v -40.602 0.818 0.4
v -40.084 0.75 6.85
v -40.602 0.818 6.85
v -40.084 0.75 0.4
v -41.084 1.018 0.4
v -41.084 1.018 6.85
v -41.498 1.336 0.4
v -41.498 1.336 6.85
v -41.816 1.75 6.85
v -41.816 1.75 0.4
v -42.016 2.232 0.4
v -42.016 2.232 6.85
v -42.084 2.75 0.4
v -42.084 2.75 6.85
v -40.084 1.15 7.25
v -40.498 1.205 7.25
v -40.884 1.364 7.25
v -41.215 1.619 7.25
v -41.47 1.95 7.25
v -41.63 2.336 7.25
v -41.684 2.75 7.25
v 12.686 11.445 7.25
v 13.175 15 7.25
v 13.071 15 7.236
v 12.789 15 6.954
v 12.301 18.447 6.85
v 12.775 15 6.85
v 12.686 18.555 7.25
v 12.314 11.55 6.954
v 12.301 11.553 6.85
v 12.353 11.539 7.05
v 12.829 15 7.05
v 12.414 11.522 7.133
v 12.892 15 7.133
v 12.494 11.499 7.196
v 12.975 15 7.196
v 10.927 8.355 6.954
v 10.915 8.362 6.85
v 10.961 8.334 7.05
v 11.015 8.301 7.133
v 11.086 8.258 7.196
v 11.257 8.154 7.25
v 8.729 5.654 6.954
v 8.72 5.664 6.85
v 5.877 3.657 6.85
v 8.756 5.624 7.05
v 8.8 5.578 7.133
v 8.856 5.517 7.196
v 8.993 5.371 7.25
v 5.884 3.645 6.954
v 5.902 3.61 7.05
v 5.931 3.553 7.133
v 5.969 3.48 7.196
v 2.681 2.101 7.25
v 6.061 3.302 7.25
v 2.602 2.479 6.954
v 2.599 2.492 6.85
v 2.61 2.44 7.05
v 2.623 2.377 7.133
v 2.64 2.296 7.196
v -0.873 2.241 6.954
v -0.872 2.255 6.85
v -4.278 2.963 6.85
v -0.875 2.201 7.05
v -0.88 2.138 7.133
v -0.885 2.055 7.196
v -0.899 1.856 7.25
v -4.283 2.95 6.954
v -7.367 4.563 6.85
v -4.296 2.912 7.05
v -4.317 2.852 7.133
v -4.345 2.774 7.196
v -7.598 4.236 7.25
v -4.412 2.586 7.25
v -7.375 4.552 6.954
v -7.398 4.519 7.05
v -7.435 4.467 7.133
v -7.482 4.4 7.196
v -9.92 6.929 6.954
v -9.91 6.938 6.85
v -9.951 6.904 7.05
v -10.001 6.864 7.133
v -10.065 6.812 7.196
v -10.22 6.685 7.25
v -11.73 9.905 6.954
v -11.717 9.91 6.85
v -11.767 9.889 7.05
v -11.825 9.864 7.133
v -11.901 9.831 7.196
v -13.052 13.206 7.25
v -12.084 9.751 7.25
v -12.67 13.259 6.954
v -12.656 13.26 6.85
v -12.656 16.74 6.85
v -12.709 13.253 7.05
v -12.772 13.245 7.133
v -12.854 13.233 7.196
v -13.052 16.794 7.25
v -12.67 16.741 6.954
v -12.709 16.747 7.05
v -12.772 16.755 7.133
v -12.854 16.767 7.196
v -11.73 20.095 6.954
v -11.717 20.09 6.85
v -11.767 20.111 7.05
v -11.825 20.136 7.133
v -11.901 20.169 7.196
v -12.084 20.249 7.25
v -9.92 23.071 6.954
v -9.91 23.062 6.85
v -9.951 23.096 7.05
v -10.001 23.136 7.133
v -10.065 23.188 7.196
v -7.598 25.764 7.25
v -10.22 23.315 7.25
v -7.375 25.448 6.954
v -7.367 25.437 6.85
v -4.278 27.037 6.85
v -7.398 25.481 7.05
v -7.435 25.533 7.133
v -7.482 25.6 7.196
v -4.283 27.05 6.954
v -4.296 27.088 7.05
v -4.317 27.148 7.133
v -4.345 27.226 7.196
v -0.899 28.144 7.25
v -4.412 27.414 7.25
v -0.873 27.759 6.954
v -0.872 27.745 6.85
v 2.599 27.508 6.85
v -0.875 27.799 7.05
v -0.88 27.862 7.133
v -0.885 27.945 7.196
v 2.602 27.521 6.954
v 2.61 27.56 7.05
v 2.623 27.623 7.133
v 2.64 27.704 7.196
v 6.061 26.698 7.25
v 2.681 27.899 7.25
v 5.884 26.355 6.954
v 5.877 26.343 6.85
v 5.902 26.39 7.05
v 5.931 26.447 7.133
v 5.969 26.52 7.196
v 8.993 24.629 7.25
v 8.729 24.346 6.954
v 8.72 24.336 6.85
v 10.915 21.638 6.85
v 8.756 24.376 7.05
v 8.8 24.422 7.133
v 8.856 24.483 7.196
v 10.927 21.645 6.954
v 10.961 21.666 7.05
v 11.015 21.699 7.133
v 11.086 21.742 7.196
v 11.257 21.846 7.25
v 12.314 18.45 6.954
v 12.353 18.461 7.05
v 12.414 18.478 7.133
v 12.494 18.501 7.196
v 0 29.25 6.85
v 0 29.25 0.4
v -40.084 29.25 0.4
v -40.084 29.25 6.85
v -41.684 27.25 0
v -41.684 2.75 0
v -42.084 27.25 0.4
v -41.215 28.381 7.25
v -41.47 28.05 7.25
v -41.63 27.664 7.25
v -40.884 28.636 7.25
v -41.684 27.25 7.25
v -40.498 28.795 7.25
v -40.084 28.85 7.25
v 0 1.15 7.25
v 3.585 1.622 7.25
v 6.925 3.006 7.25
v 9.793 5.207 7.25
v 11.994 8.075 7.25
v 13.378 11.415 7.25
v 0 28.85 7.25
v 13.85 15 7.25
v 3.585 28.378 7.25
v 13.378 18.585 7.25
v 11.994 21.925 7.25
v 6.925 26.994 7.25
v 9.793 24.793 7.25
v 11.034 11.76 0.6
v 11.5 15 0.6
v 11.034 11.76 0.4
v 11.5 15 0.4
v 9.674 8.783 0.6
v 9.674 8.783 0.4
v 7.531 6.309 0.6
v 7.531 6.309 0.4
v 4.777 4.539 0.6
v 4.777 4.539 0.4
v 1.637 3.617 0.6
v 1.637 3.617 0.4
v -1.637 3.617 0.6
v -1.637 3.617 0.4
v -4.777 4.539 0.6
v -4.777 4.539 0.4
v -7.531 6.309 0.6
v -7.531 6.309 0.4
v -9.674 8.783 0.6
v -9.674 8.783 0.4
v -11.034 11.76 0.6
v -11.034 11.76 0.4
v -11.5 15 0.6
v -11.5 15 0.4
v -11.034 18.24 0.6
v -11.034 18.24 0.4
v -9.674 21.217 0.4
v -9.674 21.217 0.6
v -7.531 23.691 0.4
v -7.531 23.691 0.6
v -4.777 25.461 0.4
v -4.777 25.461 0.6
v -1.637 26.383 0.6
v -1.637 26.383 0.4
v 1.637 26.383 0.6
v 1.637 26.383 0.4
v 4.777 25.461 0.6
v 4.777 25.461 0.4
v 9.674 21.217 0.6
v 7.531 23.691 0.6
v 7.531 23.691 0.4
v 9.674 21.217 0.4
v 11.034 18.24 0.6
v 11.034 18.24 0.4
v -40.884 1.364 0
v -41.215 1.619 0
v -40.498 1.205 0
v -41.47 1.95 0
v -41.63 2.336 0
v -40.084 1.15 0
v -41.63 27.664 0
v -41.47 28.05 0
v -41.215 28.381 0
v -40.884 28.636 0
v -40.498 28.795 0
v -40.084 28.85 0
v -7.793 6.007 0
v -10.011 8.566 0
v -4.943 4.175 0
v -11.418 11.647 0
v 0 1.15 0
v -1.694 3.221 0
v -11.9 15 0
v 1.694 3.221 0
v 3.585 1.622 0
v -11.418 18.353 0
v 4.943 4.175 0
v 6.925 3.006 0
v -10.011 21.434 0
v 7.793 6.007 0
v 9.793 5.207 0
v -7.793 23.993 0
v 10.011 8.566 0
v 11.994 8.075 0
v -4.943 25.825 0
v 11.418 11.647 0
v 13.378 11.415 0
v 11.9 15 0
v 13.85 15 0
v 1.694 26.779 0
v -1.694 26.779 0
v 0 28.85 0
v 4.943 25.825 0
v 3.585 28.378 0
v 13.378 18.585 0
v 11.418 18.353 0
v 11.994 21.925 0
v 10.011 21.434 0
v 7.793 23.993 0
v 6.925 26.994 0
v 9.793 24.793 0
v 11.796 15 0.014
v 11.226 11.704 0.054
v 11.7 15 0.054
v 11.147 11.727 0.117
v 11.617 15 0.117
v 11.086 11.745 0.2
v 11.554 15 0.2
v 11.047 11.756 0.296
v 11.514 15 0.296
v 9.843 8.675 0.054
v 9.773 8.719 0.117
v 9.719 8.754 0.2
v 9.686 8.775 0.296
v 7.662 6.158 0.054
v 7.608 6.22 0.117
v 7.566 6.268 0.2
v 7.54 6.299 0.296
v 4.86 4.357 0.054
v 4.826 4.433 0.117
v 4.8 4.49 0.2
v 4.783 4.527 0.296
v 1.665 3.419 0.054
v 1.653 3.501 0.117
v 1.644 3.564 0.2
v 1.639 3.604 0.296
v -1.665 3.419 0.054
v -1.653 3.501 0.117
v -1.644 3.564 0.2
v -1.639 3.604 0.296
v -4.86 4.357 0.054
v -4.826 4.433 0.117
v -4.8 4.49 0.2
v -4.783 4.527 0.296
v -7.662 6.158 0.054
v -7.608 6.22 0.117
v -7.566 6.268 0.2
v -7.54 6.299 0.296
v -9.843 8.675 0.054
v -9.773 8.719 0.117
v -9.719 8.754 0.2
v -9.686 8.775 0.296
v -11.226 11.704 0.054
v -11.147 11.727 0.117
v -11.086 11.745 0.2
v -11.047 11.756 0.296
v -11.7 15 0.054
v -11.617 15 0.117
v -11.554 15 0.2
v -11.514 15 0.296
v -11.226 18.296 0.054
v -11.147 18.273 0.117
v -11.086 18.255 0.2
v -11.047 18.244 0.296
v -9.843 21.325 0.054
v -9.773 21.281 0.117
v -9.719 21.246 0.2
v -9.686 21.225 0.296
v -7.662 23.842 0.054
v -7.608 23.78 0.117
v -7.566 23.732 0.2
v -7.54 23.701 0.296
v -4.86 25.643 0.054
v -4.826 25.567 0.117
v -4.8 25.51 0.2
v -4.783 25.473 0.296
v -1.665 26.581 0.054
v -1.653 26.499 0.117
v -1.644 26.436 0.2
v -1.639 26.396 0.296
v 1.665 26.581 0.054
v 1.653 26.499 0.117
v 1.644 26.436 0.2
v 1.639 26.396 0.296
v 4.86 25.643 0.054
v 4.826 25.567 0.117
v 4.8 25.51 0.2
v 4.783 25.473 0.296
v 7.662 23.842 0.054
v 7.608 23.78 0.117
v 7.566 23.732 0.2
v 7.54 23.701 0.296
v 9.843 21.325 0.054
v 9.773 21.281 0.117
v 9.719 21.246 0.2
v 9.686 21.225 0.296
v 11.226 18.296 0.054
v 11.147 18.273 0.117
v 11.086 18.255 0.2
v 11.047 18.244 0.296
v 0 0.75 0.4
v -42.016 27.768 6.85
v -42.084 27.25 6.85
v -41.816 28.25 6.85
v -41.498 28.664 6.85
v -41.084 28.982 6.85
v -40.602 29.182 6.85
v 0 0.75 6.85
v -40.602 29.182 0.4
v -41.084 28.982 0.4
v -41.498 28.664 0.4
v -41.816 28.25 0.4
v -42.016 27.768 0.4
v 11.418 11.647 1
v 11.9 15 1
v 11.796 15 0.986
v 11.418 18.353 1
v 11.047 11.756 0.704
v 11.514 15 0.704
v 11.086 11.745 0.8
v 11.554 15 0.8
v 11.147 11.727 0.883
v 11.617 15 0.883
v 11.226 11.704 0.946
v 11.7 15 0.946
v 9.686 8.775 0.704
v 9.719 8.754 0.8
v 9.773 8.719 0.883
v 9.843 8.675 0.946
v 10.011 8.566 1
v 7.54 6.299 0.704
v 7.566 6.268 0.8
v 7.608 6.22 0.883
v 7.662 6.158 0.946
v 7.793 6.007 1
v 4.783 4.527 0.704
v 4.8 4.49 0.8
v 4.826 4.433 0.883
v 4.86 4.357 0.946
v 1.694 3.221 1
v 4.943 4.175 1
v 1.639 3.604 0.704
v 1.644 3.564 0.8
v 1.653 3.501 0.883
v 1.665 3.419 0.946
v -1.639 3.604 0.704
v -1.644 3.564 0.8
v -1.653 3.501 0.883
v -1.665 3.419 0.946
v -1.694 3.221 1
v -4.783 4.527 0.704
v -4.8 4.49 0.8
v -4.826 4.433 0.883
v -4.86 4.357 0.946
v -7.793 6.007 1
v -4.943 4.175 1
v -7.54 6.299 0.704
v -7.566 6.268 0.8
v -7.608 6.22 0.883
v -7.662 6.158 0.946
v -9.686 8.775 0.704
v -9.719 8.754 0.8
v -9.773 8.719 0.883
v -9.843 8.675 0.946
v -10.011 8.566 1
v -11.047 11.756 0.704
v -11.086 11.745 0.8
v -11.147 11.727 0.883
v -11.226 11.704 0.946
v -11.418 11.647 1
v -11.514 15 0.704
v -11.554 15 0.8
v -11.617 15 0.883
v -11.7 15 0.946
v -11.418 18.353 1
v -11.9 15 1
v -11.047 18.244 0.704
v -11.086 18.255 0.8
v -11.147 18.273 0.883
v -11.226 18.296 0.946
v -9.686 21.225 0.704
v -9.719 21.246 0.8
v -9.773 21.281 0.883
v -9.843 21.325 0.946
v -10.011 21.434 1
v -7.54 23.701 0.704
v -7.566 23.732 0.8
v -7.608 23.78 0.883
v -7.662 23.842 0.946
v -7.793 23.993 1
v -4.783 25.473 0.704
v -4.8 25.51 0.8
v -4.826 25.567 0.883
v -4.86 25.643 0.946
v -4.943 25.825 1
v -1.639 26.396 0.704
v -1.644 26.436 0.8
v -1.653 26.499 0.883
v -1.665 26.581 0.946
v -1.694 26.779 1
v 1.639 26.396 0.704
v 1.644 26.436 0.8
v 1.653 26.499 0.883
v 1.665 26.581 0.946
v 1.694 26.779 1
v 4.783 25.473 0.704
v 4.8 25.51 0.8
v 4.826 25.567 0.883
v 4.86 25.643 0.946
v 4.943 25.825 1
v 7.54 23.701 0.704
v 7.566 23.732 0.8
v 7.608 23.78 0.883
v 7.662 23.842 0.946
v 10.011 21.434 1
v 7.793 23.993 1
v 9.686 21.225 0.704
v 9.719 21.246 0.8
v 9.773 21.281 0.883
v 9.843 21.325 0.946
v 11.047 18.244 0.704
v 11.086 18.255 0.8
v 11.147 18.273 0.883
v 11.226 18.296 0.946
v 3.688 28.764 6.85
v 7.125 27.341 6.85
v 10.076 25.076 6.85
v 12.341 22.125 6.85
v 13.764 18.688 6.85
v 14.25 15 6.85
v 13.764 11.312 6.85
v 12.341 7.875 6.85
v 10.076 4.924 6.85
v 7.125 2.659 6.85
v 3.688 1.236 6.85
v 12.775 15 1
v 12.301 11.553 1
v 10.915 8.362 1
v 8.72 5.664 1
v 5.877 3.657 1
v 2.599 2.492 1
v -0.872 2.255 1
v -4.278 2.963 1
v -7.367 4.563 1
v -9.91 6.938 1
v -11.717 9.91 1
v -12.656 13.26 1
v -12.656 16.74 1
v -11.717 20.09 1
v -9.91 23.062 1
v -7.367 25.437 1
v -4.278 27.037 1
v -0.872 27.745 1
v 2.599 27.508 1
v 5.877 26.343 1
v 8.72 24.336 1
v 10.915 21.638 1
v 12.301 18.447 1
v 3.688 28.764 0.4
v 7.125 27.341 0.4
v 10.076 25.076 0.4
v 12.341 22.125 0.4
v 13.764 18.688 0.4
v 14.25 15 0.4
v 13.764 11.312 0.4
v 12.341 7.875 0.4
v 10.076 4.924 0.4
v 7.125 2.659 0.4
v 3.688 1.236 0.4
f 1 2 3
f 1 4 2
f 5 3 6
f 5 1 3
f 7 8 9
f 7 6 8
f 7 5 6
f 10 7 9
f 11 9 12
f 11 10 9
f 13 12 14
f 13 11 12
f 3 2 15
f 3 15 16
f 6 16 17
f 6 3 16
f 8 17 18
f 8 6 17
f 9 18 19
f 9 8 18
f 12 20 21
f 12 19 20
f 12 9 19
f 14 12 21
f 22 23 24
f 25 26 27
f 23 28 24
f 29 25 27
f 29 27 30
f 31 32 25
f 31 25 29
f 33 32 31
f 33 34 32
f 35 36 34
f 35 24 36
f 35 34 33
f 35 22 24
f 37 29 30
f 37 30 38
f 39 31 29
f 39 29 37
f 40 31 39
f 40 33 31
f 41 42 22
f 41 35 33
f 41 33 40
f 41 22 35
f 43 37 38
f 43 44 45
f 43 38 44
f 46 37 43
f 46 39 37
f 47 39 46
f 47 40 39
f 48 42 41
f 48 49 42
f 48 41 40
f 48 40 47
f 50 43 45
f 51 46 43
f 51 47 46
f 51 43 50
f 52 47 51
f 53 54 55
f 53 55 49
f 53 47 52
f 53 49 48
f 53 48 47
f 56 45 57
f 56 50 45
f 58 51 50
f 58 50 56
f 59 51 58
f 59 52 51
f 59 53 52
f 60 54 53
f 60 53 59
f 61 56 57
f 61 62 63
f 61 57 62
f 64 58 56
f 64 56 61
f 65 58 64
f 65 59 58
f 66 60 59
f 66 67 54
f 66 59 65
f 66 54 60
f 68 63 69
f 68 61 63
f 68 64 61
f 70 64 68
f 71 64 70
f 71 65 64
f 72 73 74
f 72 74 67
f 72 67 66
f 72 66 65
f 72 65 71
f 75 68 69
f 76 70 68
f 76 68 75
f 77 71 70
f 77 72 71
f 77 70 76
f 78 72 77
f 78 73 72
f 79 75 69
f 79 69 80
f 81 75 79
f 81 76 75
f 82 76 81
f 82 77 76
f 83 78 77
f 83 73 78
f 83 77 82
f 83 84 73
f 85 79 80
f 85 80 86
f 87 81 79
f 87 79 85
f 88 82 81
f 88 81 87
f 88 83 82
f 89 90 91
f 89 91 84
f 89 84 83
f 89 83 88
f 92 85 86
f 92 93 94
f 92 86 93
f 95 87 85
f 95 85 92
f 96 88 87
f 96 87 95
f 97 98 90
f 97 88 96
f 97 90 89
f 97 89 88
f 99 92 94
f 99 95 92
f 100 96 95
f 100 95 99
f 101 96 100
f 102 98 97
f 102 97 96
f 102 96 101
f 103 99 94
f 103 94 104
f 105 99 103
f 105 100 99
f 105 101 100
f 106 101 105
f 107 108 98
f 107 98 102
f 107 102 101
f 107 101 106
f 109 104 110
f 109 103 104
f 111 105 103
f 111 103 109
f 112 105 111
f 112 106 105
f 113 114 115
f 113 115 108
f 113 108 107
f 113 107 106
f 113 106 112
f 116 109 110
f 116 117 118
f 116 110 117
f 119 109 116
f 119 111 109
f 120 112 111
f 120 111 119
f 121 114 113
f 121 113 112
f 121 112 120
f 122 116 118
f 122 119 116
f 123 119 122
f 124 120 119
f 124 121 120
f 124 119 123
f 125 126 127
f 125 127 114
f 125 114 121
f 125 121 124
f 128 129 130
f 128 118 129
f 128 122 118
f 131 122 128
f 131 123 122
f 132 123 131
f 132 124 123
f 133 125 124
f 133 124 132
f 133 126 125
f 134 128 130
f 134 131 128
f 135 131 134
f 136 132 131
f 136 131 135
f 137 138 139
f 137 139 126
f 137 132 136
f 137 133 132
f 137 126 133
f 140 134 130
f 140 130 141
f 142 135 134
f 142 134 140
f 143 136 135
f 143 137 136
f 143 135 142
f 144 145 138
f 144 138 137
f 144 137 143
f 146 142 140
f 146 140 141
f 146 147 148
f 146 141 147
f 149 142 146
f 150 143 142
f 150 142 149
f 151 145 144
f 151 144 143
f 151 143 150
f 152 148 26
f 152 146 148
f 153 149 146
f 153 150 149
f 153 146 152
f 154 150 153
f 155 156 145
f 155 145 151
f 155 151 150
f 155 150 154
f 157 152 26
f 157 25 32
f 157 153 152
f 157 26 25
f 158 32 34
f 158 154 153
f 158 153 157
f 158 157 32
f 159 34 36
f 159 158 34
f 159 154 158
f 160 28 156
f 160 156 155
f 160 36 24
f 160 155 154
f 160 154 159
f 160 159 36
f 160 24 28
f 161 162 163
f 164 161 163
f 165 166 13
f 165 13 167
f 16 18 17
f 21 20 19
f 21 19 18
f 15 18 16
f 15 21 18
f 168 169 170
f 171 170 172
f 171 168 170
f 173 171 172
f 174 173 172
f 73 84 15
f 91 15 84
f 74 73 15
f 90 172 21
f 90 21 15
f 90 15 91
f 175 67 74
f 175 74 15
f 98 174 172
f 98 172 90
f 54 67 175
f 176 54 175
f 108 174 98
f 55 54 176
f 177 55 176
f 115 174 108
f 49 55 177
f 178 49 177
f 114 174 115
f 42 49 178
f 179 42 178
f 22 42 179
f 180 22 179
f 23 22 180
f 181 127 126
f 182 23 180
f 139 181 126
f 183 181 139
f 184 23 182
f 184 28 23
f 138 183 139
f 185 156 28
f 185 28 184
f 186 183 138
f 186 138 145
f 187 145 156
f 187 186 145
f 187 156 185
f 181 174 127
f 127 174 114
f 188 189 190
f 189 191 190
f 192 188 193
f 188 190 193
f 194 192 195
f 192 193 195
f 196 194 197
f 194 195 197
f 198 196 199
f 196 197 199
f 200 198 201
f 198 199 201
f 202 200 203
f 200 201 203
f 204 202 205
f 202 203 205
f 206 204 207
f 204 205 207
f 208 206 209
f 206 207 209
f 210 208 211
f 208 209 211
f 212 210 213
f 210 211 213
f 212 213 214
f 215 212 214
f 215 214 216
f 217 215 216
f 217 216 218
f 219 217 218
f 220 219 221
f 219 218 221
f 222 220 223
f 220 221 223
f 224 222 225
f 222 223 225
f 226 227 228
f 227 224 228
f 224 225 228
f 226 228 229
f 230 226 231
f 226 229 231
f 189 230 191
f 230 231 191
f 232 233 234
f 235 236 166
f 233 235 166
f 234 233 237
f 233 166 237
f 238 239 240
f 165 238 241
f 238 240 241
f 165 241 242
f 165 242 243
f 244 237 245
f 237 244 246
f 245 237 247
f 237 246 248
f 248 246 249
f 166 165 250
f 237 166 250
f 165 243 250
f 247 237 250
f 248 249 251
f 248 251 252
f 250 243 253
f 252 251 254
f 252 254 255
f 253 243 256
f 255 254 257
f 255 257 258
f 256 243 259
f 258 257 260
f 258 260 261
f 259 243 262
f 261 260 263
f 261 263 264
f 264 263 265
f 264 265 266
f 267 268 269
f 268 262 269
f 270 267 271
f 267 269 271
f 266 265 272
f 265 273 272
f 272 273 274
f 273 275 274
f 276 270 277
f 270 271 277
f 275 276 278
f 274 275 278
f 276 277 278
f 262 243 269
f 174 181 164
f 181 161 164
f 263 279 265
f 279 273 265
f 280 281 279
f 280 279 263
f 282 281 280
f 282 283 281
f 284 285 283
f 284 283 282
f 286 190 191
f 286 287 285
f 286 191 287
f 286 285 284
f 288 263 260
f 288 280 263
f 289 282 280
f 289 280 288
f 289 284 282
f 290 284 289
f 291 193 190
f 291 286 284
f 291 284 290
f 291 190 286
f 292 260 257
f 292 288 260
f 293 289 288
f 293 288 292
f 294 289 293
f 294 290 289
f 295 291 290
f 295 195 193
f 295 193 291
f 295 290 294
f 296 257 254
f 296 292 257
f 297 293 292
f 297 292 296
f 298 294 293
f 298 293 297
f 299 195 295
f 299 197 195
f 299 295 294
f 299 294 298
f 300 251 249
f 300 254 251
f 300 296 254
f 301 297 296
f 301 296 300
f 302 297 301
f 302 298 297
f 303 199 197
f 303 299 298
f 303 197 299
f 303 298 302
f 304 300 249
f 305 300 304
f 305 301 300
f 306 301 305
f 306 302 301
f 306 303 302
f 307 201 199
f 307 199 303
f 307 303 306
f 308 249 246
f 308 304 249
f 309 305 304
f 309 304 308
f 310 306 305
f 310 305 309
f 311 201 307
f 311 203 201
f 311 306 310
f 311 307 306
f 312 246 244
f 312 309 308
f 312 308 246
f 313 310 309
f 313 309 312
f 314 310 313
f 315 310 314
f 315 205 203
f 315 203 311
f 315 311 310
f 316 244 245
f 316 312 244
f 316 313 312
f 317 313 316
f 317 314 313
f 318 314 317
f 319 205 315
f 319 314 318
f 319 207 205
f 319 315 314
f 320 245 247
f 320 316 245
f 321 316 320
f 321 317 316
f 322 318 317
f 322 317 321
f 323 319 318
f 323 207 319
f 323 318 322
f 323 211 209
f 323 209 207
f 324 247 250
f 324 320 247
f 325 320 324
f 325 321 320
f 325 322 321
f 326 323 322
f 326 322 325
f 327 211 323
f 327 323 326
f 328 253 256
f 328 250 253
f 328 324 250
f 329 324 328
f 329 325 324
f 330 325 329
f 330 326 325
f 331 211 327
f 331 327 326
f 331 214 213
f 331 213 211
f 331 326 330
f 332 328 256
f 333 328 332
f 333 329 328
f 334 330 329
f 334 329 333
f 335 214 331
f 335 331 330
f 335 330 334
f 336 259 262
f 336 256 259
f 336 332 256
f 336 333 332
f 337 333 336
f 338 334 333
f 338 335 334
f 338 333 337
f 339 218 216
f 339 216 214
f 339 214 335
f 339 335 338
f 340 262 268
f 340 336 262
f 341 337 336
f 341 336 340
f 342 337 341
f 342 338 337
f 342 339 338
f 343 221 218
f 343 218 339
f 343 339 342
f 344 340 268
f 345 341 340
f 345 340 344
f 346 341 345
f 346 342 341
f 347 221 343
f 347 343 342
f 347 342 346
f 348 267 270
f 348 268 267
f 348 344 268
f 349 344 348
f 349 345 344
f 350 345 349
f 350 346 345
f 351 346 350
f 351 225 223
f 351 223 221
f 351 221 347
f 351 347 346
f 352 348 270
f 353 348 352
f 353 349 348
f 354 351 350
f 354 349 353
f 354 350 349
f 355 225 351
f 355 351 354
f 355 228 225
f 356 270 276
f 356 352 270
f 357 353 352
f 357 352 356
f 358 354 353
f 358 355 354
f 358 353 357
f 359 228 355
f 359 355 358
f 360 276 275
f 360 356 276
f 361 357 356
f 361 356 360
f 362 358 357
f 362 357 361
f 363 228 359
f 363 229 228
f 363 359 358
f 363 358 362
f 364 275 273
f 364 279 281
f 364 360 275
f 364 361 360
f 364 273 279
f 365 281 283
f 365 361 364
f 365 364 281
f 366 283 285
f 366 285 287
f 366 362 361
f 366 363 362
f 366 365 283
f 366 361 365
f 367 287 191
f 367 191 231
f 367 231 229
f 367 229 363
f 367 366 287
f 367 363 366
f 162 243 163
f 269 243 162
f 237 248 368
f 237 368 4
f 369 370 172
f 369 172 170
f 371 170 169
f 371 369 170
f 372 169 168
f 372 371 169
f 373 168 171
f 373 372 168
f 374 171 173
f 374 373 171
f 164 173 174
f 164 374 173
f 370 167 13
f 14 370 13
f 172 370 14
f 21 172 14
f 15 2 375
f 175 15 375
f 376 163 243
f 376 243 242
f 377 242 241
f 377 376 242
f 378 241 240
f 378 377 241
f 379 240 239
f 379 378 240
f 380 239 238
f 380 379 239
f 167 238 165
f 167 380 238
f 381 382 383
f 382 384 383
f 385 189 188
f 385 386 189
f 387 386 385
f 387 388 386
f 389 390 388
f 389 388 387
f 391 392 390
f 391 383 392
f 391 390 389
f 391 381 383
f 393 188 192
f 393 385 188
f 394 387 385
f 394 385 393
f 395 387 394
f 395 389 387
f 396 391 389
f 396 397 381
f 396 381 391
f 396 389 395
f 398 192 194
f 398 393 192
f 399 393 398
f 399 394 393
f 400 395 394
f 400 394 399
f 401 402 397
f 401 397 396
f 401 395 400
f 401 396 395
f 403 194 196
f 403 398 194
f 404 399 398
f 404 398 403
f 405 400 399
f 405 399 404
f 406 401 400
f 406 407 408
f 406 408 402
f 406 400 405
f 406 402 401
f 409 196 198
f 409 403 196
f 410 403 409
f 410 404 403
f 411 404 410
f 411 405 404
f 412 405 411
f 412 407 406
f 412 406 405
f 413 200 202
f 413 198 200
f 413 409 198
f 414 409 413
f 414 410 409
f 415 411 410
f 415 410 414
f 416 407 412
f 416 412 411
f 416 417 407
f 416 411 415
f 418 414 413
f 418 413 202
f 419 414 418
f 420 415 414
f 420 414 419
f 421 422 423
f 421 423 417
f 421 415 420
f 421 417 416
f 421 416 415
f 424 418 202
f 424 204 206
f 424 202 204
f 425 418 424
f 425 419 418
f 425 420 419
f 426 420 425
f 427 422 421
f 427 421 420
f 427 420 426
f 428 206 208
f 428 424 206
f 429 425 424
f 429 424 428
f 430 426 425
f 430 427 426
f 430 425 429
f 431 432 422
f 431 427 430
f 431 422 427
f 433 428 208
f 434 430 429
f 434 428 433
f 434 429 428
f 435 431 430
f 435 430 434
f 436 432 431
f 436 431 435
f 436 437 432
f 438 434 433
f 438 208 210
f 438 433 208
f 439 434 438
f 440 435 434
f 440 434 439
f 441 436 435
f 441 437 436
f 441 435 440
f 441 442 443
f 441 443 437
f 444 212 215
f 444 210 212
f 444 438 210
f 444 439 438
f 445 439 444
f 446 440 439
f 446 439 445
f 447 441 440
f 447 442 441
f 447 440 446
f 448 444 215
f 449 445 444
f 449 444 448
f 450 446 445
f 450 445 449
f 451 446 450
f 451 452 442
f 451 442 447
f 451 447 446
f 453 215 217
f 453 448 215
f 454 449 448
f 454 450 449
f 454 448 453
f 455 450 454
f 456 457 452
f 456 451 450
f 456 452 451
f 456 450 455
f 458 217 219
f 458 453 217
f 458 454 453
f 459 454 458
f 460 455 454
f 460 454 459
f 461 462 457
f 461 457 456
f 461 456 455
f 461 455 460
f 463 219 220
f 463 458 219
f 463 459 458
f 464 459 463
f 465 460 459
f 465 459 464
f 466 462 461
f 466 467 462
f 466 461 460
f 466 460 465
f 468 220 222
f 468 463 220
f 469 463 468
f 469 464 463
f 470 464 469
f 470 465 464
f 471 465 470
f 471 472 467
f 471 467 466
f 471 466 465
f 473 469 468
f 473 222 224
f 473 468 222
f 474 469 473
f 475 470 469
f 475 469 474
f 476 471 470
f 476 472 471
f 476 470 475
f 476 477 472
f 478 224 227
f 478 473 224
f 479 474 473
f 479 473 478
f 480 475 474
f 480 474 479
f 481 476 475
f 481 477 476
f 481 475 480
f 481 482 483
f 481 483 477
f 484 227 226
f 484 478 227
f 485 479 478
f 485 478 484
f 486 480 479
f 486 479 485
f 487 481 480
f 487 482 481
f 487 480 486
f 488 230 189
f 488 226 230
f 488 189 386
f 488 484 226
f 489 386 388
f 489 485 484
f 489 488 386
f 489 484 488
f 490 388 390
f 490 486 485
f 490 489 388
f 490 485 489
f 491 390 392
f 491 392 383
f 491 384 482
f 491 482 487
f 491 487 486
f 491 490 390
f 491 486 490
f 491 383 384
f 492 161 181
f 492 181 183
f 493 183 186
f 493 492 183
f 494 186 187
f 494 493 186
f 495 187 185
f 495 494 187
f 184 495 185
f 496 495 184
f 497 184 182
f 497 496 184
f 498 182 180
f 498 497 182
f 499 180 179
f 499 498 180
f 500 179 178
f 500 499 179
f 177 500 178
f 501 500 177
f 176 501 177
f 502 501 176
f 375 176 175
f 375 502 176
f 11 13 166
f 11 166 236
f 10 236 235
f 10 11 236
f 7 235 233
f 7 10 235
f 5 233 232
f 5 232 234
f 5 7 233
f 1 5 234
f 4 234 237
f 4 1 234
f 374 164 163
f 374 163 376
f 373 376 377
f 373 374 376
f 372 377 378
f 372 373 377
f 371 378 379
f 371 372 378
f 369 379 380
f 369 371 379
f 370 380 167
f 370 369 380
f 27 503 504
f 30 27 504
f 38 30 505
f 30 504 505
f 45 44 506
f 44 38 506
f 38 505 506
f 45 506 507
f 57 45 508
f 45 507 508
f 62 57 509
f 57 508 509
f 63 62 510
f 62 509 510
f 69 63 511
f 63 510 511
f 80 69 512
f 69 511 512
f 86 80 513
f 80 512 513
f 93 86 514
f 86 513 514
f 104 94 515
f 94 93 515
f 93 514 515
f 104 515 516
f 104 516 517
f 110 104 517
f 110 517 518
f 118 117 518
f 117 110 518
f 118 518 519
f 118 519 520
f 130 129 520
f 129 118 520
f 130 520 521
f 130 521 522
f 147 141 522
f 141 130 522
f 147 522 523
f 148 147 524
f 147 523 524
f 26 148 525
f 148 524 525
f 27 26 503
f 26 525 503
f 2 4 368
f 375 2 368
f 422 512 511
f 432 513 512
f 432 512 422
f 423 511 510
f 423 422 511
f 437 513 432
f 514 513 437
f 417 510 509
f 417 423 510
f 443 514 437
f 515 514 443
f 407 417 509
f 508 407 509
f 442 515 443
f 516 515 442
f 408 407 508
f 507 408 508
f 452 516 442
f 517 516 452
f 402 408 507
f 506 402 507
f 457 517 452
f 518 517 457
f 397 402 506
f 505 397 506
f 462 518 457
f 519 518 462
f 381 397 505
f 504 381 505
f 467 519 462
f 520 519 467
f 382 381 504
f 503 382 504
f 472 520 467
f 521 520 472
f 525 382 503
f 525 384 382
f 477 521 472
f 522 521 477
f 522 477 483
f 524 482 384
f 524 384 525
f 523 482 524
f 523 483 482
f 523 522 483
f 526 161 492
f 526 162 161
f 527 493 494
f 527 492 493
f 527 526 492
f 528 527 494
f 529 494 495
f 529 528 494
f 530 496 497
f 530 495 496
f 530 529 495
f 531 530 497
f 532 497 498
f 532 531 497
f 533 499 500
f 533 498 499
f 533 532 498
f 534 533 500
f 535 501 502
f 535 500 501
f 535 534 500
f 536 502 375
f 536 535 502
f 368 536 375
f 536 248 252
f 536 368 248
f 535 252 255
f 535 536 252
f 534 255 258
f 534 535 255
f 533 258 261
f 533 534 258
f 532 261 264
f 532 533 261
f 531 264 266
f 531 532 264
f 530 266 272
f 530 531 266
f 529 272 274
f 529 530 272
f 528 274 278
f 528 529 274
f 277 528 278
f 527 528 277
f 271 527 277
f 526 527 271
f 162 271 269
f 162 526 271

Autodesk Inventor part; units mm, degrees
ref_plane "YZ Plane" through (0, 0, 0) normal (1, 0, 0) x (0, 1, 0)
ref_plane "XZ Plane" through (0, 0, 0) normal (0, 1, 0) x (-1, 0, 0)
ref_plane "XY Plane" through (0, 0, 0) normal (0, 0, 1) x (1, 0, 0)
ref_plane "Work Plane1" through (0, 0, 0) normal (0, 0, 1) x (1, 0, 0)
sketch "Sketch1" plane through (0, 0, 0) normal (0, 0, 1) x (1, 0, 0)
  arc A0 (-18.155, 30) -> (-18.155, 0) centre (0, 15) ccw construction
  line L0 (-18.155, 0) -> (-3.4871, 0) construction
  line L1 (-18.155, 30) -> (-3.4871, 30) construction
  circle A1 centre (0, 15) radius 15.4 construction
  arc A2 (-6.5238, 29.25) -> (-6.5238, 0.75) centre (0, 15) ccw construction
  line L2 (-6.5238, 0.75) -> (-17.7982, 0.75) construction
  arc A3 (-17.7982, 29.25) -> (-17.7982, 0.75) centre (0, 15) ccw construction
  line L3 (-17.7982, 29.25) -> (-6.5238, 29.25) construction
  circle A4 centre (0, 15) radius 12.775 construction
  line L4 (-6.5238, 29.25) -> (0, 29.25) construction
  line L5 (-6.5238, 0.75) -> (0, 0.75) construction
  arc A5 (0, 0.75) -> (0, 29.25) centre (0, 15) ccw construction
  line L6 (-42.0841, 29.25) -> (-42.0841, 0.75)
  line L7 (-42.0841, 0.75) -> (0, 0.75)
  line L8 (-42.0841, 29.25) -> (0, 29.25)
  circle A6 centre (0, 15) radius 11.5
  arc A7 (0, 0.75) -> (0, 29.25) centre (0, 15) ccw
  arc A8 (-3.4871, 0) -> (3.4871, 0) centre (0, 15) ccw
  line L9 (3.4871, 0) -> (18, 0)
  line L10 (18, 0) -> (18, 30)
  line L11 (3.4871, 30) -> (18, 30)
  arc A9 (3.4871, 30) -> (-3.4871, 30) centre (0, 15) ccw
  line L12 (-7.3927, 28.5095) -> (7.3927, 28.5095)
  arc A10 (7.3927, 1.4905) -> (7.3927, 28.5095) centre (0, 15) ccw
  line L13 (7.3927, 1.4905) -> (-7.3927, 1.4905)
  arc A11 (-7.3927, 28.5095) -> (-7.3927, 1.4905) centre (0, 15) ccw
  point P0 (0, 0)
  dimension "d0" = 0.75
  dimension "d1" = 25.55
  dimension "d2" = 23
extrude "Extrusion1" add sketch "Sketch1" along normal blind 1 contours L8 A7 L12 A11 L13 L7 L6 | A7 L13 A11 L12
sketch "Sketch2" plane through (0, 0, 1) normal (0, 0, 1) x (1, 0, 0)
  circle A0 centre (0, 15) radius 11.5
  line L0 (0, 29.25) -> (-42.0841, 29.25)
  line L1 (-42.0841, 29.25) -> (-42.0841, 0.75)
  line L2 (-42.0841, 0.75) -> (0, 0.75)
  arc A1 (0, 0.75) -> (0, 29.25) centre (0, 15) ccw
  circle A2 centre (0, 15) radius 12.775
  point P0 (0, 0)
  dimension "d5" = 25.55
extrude "Extrusion2" add sketch "Sketch2" along normal blind 6.25 contours A1 L2 L1 L0
fillet "Rundung1" radius 2 2 edges at (-42.0841, 0.75, 3.625) (-42.0841, 29.25, 3.625)
chamfer "Fasen1" distance 0.4 angle 45 6 edges at (-20.0421, 29.25, 7.25) (-41.4983, 28.6642, 7.25) (-42.0841, 15, 7.25) (-41.4983, 1.3358, 7.25) (-20.0421, 0.75, 7.25) (14.25, 15, 7.25)
chamfer "Fasen2" distance 0.4 angle 45 6 edges at (-20.0421, 0.75, 0) (14.25, 15, 0) (-20.0421, 29.25, 0) (-41.4983, 28.6642, 0) (-42.0841, 15, 0) (-41.4983, 1.3358, 0)
fillet "Rundung2" radius 0.4 1 edges at (-11.5, 15, 0)
fillet "Rundung3" radius 0.4 1 edges at (-11.5, 15, 1)
fillet "Rundung4" radius 0.4 1 edges at (-12.775, 15, 7.25)
properties part number "10_Filteslide_25mm"
